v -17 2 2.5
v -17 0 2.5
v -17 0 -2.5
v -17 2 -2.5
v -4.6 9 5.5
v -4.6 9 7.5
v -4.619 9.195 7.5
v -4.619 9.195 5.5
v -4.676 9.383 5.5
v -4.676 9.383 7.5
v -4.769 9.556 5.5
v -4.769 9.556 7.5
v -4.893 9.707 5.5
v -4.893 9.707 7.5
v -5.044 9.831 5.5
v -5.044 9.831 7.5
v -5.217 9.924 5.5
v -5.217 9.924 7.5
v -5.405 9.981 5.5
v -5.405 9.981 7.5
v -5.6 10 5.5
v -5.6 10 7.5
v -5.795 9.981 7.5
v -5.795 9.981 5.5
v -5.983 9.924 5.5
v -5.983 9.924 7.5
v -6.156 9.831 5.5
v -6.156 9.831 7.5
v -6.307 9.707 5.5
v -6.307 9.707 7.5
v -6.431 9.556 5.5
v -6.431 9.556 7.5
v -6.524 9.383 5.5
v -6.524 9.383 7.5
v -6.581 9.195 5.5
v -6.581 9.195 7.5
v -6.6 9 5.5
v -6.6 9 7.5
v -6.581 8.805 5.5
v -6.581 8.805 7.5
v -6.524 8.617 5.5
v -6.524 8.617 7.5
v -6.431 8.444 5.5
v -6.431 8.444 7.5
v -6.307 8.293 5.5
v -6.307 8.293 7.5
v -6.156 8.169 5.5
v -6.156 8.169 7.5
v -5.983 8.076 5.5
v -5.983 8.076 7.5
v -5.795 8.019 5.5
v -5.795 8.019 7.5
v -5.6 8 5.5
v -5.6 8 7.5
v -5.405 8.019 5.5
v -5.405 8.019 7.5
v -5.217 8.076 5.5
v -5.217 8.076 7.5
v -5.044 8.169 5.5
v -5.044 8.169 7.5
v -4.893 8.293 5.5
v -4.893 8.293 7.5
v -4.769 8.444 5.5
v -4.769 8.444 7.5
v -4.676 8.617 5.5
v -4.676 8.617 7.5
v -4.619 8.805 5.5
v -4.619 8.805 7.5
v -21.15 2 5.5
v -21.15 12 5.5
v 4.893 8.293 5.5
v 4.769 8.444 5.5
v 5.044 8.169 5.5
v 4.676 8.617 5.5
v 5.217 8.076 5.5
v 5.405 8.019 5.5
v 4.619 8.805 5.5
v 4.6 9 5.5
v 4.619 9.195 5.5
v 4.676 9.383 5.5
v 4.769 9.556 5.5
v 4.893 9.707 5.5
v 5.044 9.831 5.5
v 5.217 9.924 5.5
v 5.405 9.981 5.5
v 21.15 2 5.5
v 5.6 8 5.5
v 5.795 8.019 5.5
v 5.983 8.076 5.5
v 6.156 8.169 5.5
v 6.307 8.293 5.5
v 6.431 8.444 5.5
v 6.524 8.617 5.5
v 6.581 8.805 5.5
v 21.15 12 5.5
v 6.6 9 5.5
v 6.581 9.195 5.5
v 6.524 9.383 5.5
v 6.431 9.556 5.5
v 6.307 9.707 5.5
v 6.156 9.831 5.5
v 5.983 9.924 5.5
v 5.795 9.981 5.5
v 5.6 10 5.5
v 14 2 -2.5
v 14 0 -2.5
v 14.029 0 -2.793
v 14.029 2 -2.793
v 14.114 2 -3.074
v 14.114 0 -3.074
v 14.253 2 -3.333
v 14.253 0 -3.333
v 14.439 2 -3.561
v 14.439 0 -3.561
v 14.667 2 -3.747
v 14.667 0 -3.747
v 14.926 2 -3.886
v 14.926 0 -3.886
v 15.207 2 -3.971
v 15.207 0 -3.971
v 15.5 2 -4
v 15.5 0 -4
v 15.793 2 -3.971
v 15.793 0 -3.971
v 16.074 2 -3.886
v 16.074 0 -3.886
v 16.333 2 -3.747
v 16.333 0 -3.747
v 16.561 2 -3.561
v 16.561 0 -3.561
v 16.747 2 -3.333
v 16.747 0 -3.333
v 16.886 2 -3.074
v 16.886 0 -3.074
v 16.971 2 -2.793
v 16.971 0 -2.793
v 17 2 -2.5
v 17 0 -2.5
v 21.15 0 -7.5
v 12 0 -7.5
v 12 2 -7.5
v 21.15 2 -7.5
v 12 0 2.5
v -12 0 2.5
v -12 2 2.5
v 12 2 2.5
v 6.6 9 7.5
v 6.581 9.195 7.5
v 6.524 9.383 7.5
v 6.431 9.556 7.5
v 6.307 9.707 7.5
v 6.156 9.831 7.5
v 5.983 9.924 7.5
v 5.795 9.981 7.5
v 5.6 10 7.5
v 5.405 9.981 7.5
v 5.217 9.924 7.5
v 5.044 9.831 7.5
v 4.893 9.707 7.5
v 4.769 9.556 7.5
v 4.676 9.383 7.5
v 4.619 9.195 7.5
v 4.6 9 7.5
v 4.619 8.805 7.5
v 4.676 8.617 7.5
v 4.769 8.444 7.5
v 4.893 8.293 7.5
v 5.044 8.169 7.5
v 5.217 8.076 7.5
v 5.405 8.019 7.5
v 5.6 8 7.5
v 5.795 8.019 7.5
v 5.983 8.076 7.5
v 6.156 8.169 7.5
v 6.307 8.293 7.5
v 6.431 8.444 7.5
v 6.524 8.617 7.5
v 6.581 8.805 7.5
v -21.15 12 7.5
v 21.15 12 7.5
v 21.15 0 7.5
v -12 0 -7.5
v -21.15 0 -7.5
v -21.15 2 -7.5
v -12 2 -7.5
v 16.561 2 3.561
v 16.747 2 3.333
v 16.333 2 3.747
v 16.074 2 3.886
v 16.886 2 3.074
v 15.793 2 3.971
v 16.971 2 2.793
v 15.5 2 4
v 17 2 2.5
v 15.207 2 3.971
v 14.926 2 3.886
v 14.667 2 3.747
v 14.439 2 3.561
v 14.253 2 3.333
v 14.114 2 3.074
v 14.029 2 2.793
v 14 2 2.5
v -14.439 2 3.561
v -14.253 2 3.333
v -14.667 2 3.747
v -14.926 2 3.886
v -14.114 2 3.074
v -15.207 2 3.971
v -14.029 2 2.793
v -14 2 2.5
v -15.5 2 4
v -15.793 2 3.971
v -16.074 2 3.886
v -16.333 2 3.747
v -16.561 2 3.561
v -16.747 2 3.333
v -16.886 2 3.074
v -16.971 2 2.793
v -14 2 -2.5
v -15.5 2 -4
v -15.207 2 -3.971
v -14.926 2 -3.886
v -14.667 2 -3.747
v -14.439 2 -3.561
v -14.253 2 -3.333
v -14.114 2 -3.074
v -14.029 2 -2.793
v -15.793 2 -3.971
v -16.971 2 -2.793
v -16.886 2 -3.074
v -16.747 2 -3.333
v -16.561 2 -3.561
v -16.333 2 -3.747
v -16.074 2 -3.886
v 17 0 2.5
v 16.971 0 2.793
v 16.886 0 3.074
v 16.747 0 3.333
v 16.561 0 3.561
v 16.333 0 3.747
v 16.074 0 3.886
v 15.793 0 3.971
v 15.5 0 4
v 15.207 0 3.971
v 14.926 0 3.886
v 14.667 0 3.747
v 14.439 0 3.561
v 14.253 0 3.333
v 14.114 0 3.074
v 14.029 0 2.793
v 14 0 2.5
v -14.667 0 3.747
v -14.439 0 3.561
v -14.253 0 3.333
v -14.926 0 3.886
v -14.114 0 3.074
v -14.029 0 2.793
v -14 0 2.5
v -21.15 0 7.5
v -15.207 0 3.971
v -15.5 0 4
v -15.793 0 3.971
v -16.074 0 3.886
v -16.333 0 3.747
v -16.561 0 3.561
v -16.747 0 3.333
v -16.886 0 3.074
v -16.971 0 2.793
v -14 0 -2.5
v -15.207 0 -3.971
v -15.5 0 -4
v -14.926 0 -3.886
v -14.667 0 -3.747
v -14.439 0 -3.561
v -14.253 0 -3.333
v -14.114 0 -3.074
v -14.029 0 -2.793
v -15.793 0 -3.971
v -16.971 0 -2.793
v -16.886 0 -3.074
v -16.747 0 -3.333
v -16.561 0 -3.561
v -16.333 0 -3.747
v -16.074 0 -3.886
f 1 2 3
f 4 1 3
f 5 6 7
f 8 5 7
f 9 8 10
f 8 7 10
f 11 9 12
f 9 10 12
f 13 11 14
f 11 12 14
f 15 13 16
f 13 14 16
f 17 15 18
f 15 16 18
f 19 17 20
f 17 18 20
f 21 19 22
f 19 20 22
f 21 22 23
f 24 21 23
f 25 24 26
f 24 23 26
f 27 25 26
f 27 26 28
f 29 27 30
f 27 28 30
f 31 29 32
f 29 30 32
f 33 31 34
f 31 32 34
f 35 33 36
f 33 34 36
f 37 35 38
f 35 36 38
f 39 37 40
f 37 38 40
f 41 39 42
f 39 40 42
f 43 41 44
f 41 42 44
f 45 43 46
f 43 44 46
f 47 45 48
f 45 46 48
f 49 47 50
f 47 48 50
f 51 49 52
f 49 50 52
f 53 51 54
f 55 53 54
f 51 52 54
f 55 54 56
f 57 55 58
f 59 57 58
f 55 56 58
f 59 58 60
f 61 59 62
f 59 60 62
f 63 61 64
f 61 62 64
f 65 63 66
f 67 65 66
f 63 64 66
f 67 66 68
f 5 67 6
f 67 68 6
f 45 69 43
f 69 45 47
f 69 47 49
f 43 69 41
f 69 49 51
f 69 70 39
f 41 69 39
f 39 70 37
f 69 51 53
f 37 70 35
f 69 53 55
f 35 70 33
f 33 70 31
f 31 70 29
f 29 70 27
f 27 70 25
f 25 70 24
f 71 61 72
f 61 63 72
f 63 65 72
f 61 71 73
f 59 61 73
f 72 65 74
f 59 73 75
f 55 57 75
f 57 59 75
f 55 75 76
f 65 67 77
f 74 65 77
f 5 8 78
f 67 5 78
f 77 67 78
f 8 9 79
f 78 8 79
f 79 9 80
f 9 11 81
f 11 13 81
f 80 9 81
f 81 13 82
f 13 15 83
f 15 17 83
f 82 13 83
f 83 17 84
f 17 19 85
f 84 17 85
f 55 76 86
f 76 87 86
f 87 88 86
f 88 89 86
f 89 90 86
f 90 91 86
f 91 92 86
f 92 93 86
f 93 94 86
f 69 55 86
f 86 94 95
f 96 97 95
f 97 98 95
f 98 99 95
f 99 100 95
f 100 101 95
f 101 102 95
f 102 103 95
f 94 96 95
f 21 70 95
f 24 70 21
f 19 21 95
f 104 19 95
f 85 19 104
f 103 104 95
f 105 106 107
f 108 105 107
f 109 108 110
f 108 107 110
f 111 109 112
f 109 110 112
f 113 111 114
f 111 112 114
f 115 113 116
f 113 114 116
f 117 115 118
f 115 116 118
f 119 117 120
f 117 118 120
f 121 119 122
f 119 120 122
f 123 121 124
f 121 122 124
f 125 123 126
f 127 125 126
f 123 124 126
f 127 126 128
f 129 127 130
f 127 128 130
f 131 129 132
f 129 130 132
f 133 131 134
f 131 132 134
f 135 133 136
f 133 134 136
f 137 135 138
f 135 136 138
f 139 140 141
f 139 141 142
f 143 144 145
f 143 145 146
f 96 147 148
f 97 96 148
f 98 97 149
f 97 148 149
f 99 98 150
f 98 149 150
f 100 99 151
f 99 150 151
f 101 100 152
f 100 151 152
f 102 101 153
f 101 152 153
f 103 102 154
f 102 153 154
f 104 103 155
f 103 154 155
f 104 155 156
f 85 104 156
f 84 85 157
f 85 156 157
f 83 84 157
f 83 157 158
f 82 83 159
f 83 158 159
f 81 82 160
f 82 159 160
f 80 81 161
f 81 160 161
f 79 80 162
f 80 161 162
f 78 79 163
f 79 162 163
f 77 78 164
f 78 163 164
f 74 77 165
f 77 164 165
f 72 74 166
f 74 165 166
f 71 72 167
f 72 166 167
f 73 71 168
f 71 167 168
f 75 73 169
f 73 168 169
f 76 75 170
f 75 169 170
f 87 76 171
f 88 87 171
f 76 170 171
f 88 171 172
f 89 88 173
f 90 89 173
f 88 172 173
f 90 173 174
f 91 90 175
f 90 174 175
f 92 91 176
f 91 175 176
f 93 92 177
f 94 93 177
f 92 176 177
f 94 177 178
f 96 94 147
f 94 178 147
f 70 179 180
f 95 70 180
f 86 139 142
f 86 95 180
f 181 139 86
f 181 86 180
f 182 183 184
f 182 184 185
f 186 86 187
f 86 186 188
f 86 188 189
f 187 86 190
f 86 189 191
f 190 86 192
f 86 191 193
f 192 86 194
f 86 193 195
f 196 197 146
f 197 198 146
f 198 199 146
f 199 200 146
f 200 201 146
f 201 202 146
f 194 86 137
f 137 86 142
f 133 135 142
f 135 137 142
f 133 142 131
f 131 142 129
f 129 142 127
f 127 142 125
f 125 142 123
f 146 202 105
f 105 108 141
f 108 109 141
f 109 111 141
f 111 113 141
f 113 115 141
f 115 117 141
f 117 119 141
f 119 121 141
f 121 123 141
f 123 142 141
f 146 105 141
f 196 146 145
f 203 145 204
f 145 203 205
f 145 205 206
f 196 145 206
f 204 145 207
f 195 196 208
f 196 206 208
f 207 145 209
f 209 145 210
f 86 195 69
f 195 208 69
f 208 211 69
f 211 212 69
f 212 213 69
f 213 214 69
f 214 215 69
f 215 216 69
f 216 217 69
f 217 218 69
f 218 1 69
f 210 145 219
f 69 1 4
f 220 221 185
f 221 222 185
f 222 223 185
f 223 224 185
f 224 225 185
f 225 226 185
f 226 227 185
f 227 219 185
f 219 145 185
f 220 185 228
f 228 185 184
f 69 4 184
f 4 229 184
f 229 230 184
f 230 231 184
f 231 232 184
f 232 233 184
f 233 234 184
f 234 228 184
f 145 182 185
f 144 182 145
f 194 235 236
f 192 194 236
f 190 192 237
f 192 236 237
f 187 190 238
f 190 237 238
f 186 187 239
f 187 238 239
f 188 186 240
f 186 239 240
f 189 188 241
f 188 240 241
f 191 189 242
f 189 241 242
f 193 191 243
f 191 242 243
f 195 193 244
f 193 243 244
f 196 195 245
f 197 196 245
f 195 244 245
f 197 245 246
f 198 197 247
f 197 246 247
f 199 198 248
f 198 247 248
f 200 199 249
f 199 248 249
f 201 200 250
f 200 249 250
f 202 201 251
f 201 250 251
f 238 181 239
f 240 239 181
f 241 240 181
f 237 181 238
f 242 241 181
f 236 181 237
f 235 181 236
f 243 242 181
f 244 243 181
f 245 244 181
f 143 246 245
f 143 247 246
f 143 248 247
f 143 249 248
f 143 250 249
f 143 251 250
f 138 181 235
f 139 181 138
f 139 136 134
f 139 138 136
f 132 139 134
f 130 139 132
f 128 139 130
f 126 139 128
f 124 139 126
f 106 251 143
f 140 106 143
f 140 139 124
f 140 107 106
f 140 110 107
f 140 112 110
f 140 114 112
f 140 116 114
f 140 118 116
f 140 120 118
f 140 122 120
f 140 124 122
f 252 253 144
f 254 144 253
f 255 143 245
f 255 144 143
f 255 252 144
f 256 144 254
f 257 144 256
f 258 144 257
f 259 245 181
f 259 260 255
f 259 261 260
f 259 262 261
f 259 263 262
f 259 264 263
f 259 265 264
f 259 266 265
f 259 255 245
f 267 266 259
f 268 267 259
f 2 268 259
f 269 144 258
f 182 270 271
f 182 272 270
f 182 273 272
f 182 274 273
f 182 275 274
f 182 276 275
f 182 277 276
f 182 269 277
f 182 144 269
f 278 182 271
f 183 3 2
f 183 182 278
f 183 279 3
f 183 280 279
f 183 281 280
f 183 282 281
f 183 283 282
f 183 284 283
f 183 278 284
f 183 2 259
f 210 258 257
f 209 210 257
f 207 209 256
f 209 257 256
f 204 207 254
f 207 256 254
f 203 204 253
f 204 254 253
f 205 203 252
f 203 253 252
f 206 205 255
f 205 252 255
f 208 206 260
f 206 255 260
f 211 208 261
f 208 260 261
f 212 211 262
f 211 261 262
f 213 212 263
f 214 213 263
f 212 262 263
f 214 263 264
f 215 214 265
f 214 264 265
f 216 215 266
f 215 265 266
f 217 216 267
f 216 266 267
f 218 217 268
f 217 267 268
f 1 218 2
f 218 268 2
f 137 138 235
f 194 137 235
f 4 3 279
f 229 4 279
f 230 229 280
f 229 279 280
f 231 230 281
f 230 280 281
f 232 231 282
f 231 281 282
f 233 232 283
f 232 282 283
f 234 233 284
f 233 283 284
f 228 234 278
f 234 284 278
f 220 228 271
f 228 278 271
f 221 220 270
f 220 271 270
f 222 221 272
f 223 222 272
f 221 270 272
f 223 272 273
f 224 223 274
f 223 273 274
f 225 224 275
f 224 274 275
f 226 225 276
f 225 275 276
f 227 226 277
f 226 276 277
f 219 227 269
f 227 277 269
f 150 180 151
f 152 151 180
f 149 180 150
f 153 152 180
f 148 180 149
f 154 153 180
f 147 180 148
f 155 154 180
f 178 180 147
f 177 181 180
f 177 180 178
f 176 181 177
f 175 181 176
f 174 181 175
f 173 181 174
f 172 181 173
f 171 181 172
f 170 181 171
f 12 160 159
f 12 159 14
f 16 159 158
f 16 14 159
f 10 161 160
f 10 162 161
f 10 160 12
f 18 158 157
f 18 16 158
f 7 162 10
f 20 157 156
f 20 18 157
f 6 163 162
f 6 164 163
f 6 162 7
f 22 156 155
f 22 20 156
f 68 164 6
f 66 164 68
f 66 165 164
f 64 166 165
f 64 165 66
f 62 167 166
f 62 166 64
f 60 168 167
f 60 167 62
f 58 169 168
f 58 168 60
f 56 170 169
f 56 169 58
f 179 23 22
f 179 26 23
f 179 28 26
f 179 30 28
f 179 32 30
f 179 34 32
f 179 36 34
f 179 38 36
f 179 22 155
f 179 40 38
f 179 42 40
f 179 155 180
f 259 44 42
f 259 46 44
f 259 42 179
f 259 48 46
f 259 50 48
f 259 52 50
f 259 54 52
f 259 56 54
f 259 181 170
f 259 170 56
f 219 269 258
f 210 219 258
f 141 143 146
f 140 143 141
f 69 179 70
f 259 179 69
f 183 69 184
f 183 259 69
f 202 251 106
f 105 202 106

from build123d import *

# Parameters (mm, degrees)
DODANIE_WYCI_GNI_CIE1_DEPTH = 2
SZKIC4_W                    = 42.3
SZKIC4_H                    = 12
SZKIC4_R                    = 1
DODANIE_WYCI_GNI_CIE2_DEPTH = 2


with BuildPart() as part:
    # Szkic1 → Dodanie-wyciągnięcie1 (new body)
    with BuildSketch(Plane(origin=(0, 0, 0), x_dir=(1, 0, 0), z_dir=(0, 1, 0))):
        Polygon((-21.15, 7.5), (-12, 7.5), (-12, -2.5), (12, -2.5), (12, 7.5), (21.15, 7.5), (21.15, -7.5), (-21.15, -7.5), align=None)
        with BuildLine():
            Line((-14, 2.5), (-14, -2.5))
            ThreePointArc((-14, -2.5), (-15.5, -4), (-17, -2.5))
            Line((-17, -2.5), (-17, 2.5))
            ThreePointArc((-17, 2.5), (-15.5, 4), (-14, 2.5))
        make_face(mode=Mode.SUBTRACT)
        with BuildLine():
            Line((17, 2.5), (17, -2.5))
            ThreePointArc((17, -2.5), (15.5, -4), (14, -2.5))
            Line((14, -2.5), (14, 2.5))
            ThreePointArc((14, 2.5), (15.5, 4), (17, 2.5))
        make_face(mode=Mode.SUBTRACT)
    extrude(amount=DODANIE_WYCI_GNI_CIE1_DEPTH)

    # Szkic4 → Dodanie-wyciągnięcie2 (add)
    with BuildSketch(Plane.XY.offset(7.5)):
        with Locations((0, 6)):
            Rectangle(SZKIC4_W, SZKIC4_H)
        with Locations((-5.6, 9)):
            Circle(SZKIC4_R, mode=Mode.SUBTRACT)
        with Locations((5.6, 9)):
            Circle(SZKIC4_R, mode=Mode.SUBTRACT)
    extrude(amount=-DODANIE_WYCI_GNI_CIE2_DEPTH)


solid = part.part
